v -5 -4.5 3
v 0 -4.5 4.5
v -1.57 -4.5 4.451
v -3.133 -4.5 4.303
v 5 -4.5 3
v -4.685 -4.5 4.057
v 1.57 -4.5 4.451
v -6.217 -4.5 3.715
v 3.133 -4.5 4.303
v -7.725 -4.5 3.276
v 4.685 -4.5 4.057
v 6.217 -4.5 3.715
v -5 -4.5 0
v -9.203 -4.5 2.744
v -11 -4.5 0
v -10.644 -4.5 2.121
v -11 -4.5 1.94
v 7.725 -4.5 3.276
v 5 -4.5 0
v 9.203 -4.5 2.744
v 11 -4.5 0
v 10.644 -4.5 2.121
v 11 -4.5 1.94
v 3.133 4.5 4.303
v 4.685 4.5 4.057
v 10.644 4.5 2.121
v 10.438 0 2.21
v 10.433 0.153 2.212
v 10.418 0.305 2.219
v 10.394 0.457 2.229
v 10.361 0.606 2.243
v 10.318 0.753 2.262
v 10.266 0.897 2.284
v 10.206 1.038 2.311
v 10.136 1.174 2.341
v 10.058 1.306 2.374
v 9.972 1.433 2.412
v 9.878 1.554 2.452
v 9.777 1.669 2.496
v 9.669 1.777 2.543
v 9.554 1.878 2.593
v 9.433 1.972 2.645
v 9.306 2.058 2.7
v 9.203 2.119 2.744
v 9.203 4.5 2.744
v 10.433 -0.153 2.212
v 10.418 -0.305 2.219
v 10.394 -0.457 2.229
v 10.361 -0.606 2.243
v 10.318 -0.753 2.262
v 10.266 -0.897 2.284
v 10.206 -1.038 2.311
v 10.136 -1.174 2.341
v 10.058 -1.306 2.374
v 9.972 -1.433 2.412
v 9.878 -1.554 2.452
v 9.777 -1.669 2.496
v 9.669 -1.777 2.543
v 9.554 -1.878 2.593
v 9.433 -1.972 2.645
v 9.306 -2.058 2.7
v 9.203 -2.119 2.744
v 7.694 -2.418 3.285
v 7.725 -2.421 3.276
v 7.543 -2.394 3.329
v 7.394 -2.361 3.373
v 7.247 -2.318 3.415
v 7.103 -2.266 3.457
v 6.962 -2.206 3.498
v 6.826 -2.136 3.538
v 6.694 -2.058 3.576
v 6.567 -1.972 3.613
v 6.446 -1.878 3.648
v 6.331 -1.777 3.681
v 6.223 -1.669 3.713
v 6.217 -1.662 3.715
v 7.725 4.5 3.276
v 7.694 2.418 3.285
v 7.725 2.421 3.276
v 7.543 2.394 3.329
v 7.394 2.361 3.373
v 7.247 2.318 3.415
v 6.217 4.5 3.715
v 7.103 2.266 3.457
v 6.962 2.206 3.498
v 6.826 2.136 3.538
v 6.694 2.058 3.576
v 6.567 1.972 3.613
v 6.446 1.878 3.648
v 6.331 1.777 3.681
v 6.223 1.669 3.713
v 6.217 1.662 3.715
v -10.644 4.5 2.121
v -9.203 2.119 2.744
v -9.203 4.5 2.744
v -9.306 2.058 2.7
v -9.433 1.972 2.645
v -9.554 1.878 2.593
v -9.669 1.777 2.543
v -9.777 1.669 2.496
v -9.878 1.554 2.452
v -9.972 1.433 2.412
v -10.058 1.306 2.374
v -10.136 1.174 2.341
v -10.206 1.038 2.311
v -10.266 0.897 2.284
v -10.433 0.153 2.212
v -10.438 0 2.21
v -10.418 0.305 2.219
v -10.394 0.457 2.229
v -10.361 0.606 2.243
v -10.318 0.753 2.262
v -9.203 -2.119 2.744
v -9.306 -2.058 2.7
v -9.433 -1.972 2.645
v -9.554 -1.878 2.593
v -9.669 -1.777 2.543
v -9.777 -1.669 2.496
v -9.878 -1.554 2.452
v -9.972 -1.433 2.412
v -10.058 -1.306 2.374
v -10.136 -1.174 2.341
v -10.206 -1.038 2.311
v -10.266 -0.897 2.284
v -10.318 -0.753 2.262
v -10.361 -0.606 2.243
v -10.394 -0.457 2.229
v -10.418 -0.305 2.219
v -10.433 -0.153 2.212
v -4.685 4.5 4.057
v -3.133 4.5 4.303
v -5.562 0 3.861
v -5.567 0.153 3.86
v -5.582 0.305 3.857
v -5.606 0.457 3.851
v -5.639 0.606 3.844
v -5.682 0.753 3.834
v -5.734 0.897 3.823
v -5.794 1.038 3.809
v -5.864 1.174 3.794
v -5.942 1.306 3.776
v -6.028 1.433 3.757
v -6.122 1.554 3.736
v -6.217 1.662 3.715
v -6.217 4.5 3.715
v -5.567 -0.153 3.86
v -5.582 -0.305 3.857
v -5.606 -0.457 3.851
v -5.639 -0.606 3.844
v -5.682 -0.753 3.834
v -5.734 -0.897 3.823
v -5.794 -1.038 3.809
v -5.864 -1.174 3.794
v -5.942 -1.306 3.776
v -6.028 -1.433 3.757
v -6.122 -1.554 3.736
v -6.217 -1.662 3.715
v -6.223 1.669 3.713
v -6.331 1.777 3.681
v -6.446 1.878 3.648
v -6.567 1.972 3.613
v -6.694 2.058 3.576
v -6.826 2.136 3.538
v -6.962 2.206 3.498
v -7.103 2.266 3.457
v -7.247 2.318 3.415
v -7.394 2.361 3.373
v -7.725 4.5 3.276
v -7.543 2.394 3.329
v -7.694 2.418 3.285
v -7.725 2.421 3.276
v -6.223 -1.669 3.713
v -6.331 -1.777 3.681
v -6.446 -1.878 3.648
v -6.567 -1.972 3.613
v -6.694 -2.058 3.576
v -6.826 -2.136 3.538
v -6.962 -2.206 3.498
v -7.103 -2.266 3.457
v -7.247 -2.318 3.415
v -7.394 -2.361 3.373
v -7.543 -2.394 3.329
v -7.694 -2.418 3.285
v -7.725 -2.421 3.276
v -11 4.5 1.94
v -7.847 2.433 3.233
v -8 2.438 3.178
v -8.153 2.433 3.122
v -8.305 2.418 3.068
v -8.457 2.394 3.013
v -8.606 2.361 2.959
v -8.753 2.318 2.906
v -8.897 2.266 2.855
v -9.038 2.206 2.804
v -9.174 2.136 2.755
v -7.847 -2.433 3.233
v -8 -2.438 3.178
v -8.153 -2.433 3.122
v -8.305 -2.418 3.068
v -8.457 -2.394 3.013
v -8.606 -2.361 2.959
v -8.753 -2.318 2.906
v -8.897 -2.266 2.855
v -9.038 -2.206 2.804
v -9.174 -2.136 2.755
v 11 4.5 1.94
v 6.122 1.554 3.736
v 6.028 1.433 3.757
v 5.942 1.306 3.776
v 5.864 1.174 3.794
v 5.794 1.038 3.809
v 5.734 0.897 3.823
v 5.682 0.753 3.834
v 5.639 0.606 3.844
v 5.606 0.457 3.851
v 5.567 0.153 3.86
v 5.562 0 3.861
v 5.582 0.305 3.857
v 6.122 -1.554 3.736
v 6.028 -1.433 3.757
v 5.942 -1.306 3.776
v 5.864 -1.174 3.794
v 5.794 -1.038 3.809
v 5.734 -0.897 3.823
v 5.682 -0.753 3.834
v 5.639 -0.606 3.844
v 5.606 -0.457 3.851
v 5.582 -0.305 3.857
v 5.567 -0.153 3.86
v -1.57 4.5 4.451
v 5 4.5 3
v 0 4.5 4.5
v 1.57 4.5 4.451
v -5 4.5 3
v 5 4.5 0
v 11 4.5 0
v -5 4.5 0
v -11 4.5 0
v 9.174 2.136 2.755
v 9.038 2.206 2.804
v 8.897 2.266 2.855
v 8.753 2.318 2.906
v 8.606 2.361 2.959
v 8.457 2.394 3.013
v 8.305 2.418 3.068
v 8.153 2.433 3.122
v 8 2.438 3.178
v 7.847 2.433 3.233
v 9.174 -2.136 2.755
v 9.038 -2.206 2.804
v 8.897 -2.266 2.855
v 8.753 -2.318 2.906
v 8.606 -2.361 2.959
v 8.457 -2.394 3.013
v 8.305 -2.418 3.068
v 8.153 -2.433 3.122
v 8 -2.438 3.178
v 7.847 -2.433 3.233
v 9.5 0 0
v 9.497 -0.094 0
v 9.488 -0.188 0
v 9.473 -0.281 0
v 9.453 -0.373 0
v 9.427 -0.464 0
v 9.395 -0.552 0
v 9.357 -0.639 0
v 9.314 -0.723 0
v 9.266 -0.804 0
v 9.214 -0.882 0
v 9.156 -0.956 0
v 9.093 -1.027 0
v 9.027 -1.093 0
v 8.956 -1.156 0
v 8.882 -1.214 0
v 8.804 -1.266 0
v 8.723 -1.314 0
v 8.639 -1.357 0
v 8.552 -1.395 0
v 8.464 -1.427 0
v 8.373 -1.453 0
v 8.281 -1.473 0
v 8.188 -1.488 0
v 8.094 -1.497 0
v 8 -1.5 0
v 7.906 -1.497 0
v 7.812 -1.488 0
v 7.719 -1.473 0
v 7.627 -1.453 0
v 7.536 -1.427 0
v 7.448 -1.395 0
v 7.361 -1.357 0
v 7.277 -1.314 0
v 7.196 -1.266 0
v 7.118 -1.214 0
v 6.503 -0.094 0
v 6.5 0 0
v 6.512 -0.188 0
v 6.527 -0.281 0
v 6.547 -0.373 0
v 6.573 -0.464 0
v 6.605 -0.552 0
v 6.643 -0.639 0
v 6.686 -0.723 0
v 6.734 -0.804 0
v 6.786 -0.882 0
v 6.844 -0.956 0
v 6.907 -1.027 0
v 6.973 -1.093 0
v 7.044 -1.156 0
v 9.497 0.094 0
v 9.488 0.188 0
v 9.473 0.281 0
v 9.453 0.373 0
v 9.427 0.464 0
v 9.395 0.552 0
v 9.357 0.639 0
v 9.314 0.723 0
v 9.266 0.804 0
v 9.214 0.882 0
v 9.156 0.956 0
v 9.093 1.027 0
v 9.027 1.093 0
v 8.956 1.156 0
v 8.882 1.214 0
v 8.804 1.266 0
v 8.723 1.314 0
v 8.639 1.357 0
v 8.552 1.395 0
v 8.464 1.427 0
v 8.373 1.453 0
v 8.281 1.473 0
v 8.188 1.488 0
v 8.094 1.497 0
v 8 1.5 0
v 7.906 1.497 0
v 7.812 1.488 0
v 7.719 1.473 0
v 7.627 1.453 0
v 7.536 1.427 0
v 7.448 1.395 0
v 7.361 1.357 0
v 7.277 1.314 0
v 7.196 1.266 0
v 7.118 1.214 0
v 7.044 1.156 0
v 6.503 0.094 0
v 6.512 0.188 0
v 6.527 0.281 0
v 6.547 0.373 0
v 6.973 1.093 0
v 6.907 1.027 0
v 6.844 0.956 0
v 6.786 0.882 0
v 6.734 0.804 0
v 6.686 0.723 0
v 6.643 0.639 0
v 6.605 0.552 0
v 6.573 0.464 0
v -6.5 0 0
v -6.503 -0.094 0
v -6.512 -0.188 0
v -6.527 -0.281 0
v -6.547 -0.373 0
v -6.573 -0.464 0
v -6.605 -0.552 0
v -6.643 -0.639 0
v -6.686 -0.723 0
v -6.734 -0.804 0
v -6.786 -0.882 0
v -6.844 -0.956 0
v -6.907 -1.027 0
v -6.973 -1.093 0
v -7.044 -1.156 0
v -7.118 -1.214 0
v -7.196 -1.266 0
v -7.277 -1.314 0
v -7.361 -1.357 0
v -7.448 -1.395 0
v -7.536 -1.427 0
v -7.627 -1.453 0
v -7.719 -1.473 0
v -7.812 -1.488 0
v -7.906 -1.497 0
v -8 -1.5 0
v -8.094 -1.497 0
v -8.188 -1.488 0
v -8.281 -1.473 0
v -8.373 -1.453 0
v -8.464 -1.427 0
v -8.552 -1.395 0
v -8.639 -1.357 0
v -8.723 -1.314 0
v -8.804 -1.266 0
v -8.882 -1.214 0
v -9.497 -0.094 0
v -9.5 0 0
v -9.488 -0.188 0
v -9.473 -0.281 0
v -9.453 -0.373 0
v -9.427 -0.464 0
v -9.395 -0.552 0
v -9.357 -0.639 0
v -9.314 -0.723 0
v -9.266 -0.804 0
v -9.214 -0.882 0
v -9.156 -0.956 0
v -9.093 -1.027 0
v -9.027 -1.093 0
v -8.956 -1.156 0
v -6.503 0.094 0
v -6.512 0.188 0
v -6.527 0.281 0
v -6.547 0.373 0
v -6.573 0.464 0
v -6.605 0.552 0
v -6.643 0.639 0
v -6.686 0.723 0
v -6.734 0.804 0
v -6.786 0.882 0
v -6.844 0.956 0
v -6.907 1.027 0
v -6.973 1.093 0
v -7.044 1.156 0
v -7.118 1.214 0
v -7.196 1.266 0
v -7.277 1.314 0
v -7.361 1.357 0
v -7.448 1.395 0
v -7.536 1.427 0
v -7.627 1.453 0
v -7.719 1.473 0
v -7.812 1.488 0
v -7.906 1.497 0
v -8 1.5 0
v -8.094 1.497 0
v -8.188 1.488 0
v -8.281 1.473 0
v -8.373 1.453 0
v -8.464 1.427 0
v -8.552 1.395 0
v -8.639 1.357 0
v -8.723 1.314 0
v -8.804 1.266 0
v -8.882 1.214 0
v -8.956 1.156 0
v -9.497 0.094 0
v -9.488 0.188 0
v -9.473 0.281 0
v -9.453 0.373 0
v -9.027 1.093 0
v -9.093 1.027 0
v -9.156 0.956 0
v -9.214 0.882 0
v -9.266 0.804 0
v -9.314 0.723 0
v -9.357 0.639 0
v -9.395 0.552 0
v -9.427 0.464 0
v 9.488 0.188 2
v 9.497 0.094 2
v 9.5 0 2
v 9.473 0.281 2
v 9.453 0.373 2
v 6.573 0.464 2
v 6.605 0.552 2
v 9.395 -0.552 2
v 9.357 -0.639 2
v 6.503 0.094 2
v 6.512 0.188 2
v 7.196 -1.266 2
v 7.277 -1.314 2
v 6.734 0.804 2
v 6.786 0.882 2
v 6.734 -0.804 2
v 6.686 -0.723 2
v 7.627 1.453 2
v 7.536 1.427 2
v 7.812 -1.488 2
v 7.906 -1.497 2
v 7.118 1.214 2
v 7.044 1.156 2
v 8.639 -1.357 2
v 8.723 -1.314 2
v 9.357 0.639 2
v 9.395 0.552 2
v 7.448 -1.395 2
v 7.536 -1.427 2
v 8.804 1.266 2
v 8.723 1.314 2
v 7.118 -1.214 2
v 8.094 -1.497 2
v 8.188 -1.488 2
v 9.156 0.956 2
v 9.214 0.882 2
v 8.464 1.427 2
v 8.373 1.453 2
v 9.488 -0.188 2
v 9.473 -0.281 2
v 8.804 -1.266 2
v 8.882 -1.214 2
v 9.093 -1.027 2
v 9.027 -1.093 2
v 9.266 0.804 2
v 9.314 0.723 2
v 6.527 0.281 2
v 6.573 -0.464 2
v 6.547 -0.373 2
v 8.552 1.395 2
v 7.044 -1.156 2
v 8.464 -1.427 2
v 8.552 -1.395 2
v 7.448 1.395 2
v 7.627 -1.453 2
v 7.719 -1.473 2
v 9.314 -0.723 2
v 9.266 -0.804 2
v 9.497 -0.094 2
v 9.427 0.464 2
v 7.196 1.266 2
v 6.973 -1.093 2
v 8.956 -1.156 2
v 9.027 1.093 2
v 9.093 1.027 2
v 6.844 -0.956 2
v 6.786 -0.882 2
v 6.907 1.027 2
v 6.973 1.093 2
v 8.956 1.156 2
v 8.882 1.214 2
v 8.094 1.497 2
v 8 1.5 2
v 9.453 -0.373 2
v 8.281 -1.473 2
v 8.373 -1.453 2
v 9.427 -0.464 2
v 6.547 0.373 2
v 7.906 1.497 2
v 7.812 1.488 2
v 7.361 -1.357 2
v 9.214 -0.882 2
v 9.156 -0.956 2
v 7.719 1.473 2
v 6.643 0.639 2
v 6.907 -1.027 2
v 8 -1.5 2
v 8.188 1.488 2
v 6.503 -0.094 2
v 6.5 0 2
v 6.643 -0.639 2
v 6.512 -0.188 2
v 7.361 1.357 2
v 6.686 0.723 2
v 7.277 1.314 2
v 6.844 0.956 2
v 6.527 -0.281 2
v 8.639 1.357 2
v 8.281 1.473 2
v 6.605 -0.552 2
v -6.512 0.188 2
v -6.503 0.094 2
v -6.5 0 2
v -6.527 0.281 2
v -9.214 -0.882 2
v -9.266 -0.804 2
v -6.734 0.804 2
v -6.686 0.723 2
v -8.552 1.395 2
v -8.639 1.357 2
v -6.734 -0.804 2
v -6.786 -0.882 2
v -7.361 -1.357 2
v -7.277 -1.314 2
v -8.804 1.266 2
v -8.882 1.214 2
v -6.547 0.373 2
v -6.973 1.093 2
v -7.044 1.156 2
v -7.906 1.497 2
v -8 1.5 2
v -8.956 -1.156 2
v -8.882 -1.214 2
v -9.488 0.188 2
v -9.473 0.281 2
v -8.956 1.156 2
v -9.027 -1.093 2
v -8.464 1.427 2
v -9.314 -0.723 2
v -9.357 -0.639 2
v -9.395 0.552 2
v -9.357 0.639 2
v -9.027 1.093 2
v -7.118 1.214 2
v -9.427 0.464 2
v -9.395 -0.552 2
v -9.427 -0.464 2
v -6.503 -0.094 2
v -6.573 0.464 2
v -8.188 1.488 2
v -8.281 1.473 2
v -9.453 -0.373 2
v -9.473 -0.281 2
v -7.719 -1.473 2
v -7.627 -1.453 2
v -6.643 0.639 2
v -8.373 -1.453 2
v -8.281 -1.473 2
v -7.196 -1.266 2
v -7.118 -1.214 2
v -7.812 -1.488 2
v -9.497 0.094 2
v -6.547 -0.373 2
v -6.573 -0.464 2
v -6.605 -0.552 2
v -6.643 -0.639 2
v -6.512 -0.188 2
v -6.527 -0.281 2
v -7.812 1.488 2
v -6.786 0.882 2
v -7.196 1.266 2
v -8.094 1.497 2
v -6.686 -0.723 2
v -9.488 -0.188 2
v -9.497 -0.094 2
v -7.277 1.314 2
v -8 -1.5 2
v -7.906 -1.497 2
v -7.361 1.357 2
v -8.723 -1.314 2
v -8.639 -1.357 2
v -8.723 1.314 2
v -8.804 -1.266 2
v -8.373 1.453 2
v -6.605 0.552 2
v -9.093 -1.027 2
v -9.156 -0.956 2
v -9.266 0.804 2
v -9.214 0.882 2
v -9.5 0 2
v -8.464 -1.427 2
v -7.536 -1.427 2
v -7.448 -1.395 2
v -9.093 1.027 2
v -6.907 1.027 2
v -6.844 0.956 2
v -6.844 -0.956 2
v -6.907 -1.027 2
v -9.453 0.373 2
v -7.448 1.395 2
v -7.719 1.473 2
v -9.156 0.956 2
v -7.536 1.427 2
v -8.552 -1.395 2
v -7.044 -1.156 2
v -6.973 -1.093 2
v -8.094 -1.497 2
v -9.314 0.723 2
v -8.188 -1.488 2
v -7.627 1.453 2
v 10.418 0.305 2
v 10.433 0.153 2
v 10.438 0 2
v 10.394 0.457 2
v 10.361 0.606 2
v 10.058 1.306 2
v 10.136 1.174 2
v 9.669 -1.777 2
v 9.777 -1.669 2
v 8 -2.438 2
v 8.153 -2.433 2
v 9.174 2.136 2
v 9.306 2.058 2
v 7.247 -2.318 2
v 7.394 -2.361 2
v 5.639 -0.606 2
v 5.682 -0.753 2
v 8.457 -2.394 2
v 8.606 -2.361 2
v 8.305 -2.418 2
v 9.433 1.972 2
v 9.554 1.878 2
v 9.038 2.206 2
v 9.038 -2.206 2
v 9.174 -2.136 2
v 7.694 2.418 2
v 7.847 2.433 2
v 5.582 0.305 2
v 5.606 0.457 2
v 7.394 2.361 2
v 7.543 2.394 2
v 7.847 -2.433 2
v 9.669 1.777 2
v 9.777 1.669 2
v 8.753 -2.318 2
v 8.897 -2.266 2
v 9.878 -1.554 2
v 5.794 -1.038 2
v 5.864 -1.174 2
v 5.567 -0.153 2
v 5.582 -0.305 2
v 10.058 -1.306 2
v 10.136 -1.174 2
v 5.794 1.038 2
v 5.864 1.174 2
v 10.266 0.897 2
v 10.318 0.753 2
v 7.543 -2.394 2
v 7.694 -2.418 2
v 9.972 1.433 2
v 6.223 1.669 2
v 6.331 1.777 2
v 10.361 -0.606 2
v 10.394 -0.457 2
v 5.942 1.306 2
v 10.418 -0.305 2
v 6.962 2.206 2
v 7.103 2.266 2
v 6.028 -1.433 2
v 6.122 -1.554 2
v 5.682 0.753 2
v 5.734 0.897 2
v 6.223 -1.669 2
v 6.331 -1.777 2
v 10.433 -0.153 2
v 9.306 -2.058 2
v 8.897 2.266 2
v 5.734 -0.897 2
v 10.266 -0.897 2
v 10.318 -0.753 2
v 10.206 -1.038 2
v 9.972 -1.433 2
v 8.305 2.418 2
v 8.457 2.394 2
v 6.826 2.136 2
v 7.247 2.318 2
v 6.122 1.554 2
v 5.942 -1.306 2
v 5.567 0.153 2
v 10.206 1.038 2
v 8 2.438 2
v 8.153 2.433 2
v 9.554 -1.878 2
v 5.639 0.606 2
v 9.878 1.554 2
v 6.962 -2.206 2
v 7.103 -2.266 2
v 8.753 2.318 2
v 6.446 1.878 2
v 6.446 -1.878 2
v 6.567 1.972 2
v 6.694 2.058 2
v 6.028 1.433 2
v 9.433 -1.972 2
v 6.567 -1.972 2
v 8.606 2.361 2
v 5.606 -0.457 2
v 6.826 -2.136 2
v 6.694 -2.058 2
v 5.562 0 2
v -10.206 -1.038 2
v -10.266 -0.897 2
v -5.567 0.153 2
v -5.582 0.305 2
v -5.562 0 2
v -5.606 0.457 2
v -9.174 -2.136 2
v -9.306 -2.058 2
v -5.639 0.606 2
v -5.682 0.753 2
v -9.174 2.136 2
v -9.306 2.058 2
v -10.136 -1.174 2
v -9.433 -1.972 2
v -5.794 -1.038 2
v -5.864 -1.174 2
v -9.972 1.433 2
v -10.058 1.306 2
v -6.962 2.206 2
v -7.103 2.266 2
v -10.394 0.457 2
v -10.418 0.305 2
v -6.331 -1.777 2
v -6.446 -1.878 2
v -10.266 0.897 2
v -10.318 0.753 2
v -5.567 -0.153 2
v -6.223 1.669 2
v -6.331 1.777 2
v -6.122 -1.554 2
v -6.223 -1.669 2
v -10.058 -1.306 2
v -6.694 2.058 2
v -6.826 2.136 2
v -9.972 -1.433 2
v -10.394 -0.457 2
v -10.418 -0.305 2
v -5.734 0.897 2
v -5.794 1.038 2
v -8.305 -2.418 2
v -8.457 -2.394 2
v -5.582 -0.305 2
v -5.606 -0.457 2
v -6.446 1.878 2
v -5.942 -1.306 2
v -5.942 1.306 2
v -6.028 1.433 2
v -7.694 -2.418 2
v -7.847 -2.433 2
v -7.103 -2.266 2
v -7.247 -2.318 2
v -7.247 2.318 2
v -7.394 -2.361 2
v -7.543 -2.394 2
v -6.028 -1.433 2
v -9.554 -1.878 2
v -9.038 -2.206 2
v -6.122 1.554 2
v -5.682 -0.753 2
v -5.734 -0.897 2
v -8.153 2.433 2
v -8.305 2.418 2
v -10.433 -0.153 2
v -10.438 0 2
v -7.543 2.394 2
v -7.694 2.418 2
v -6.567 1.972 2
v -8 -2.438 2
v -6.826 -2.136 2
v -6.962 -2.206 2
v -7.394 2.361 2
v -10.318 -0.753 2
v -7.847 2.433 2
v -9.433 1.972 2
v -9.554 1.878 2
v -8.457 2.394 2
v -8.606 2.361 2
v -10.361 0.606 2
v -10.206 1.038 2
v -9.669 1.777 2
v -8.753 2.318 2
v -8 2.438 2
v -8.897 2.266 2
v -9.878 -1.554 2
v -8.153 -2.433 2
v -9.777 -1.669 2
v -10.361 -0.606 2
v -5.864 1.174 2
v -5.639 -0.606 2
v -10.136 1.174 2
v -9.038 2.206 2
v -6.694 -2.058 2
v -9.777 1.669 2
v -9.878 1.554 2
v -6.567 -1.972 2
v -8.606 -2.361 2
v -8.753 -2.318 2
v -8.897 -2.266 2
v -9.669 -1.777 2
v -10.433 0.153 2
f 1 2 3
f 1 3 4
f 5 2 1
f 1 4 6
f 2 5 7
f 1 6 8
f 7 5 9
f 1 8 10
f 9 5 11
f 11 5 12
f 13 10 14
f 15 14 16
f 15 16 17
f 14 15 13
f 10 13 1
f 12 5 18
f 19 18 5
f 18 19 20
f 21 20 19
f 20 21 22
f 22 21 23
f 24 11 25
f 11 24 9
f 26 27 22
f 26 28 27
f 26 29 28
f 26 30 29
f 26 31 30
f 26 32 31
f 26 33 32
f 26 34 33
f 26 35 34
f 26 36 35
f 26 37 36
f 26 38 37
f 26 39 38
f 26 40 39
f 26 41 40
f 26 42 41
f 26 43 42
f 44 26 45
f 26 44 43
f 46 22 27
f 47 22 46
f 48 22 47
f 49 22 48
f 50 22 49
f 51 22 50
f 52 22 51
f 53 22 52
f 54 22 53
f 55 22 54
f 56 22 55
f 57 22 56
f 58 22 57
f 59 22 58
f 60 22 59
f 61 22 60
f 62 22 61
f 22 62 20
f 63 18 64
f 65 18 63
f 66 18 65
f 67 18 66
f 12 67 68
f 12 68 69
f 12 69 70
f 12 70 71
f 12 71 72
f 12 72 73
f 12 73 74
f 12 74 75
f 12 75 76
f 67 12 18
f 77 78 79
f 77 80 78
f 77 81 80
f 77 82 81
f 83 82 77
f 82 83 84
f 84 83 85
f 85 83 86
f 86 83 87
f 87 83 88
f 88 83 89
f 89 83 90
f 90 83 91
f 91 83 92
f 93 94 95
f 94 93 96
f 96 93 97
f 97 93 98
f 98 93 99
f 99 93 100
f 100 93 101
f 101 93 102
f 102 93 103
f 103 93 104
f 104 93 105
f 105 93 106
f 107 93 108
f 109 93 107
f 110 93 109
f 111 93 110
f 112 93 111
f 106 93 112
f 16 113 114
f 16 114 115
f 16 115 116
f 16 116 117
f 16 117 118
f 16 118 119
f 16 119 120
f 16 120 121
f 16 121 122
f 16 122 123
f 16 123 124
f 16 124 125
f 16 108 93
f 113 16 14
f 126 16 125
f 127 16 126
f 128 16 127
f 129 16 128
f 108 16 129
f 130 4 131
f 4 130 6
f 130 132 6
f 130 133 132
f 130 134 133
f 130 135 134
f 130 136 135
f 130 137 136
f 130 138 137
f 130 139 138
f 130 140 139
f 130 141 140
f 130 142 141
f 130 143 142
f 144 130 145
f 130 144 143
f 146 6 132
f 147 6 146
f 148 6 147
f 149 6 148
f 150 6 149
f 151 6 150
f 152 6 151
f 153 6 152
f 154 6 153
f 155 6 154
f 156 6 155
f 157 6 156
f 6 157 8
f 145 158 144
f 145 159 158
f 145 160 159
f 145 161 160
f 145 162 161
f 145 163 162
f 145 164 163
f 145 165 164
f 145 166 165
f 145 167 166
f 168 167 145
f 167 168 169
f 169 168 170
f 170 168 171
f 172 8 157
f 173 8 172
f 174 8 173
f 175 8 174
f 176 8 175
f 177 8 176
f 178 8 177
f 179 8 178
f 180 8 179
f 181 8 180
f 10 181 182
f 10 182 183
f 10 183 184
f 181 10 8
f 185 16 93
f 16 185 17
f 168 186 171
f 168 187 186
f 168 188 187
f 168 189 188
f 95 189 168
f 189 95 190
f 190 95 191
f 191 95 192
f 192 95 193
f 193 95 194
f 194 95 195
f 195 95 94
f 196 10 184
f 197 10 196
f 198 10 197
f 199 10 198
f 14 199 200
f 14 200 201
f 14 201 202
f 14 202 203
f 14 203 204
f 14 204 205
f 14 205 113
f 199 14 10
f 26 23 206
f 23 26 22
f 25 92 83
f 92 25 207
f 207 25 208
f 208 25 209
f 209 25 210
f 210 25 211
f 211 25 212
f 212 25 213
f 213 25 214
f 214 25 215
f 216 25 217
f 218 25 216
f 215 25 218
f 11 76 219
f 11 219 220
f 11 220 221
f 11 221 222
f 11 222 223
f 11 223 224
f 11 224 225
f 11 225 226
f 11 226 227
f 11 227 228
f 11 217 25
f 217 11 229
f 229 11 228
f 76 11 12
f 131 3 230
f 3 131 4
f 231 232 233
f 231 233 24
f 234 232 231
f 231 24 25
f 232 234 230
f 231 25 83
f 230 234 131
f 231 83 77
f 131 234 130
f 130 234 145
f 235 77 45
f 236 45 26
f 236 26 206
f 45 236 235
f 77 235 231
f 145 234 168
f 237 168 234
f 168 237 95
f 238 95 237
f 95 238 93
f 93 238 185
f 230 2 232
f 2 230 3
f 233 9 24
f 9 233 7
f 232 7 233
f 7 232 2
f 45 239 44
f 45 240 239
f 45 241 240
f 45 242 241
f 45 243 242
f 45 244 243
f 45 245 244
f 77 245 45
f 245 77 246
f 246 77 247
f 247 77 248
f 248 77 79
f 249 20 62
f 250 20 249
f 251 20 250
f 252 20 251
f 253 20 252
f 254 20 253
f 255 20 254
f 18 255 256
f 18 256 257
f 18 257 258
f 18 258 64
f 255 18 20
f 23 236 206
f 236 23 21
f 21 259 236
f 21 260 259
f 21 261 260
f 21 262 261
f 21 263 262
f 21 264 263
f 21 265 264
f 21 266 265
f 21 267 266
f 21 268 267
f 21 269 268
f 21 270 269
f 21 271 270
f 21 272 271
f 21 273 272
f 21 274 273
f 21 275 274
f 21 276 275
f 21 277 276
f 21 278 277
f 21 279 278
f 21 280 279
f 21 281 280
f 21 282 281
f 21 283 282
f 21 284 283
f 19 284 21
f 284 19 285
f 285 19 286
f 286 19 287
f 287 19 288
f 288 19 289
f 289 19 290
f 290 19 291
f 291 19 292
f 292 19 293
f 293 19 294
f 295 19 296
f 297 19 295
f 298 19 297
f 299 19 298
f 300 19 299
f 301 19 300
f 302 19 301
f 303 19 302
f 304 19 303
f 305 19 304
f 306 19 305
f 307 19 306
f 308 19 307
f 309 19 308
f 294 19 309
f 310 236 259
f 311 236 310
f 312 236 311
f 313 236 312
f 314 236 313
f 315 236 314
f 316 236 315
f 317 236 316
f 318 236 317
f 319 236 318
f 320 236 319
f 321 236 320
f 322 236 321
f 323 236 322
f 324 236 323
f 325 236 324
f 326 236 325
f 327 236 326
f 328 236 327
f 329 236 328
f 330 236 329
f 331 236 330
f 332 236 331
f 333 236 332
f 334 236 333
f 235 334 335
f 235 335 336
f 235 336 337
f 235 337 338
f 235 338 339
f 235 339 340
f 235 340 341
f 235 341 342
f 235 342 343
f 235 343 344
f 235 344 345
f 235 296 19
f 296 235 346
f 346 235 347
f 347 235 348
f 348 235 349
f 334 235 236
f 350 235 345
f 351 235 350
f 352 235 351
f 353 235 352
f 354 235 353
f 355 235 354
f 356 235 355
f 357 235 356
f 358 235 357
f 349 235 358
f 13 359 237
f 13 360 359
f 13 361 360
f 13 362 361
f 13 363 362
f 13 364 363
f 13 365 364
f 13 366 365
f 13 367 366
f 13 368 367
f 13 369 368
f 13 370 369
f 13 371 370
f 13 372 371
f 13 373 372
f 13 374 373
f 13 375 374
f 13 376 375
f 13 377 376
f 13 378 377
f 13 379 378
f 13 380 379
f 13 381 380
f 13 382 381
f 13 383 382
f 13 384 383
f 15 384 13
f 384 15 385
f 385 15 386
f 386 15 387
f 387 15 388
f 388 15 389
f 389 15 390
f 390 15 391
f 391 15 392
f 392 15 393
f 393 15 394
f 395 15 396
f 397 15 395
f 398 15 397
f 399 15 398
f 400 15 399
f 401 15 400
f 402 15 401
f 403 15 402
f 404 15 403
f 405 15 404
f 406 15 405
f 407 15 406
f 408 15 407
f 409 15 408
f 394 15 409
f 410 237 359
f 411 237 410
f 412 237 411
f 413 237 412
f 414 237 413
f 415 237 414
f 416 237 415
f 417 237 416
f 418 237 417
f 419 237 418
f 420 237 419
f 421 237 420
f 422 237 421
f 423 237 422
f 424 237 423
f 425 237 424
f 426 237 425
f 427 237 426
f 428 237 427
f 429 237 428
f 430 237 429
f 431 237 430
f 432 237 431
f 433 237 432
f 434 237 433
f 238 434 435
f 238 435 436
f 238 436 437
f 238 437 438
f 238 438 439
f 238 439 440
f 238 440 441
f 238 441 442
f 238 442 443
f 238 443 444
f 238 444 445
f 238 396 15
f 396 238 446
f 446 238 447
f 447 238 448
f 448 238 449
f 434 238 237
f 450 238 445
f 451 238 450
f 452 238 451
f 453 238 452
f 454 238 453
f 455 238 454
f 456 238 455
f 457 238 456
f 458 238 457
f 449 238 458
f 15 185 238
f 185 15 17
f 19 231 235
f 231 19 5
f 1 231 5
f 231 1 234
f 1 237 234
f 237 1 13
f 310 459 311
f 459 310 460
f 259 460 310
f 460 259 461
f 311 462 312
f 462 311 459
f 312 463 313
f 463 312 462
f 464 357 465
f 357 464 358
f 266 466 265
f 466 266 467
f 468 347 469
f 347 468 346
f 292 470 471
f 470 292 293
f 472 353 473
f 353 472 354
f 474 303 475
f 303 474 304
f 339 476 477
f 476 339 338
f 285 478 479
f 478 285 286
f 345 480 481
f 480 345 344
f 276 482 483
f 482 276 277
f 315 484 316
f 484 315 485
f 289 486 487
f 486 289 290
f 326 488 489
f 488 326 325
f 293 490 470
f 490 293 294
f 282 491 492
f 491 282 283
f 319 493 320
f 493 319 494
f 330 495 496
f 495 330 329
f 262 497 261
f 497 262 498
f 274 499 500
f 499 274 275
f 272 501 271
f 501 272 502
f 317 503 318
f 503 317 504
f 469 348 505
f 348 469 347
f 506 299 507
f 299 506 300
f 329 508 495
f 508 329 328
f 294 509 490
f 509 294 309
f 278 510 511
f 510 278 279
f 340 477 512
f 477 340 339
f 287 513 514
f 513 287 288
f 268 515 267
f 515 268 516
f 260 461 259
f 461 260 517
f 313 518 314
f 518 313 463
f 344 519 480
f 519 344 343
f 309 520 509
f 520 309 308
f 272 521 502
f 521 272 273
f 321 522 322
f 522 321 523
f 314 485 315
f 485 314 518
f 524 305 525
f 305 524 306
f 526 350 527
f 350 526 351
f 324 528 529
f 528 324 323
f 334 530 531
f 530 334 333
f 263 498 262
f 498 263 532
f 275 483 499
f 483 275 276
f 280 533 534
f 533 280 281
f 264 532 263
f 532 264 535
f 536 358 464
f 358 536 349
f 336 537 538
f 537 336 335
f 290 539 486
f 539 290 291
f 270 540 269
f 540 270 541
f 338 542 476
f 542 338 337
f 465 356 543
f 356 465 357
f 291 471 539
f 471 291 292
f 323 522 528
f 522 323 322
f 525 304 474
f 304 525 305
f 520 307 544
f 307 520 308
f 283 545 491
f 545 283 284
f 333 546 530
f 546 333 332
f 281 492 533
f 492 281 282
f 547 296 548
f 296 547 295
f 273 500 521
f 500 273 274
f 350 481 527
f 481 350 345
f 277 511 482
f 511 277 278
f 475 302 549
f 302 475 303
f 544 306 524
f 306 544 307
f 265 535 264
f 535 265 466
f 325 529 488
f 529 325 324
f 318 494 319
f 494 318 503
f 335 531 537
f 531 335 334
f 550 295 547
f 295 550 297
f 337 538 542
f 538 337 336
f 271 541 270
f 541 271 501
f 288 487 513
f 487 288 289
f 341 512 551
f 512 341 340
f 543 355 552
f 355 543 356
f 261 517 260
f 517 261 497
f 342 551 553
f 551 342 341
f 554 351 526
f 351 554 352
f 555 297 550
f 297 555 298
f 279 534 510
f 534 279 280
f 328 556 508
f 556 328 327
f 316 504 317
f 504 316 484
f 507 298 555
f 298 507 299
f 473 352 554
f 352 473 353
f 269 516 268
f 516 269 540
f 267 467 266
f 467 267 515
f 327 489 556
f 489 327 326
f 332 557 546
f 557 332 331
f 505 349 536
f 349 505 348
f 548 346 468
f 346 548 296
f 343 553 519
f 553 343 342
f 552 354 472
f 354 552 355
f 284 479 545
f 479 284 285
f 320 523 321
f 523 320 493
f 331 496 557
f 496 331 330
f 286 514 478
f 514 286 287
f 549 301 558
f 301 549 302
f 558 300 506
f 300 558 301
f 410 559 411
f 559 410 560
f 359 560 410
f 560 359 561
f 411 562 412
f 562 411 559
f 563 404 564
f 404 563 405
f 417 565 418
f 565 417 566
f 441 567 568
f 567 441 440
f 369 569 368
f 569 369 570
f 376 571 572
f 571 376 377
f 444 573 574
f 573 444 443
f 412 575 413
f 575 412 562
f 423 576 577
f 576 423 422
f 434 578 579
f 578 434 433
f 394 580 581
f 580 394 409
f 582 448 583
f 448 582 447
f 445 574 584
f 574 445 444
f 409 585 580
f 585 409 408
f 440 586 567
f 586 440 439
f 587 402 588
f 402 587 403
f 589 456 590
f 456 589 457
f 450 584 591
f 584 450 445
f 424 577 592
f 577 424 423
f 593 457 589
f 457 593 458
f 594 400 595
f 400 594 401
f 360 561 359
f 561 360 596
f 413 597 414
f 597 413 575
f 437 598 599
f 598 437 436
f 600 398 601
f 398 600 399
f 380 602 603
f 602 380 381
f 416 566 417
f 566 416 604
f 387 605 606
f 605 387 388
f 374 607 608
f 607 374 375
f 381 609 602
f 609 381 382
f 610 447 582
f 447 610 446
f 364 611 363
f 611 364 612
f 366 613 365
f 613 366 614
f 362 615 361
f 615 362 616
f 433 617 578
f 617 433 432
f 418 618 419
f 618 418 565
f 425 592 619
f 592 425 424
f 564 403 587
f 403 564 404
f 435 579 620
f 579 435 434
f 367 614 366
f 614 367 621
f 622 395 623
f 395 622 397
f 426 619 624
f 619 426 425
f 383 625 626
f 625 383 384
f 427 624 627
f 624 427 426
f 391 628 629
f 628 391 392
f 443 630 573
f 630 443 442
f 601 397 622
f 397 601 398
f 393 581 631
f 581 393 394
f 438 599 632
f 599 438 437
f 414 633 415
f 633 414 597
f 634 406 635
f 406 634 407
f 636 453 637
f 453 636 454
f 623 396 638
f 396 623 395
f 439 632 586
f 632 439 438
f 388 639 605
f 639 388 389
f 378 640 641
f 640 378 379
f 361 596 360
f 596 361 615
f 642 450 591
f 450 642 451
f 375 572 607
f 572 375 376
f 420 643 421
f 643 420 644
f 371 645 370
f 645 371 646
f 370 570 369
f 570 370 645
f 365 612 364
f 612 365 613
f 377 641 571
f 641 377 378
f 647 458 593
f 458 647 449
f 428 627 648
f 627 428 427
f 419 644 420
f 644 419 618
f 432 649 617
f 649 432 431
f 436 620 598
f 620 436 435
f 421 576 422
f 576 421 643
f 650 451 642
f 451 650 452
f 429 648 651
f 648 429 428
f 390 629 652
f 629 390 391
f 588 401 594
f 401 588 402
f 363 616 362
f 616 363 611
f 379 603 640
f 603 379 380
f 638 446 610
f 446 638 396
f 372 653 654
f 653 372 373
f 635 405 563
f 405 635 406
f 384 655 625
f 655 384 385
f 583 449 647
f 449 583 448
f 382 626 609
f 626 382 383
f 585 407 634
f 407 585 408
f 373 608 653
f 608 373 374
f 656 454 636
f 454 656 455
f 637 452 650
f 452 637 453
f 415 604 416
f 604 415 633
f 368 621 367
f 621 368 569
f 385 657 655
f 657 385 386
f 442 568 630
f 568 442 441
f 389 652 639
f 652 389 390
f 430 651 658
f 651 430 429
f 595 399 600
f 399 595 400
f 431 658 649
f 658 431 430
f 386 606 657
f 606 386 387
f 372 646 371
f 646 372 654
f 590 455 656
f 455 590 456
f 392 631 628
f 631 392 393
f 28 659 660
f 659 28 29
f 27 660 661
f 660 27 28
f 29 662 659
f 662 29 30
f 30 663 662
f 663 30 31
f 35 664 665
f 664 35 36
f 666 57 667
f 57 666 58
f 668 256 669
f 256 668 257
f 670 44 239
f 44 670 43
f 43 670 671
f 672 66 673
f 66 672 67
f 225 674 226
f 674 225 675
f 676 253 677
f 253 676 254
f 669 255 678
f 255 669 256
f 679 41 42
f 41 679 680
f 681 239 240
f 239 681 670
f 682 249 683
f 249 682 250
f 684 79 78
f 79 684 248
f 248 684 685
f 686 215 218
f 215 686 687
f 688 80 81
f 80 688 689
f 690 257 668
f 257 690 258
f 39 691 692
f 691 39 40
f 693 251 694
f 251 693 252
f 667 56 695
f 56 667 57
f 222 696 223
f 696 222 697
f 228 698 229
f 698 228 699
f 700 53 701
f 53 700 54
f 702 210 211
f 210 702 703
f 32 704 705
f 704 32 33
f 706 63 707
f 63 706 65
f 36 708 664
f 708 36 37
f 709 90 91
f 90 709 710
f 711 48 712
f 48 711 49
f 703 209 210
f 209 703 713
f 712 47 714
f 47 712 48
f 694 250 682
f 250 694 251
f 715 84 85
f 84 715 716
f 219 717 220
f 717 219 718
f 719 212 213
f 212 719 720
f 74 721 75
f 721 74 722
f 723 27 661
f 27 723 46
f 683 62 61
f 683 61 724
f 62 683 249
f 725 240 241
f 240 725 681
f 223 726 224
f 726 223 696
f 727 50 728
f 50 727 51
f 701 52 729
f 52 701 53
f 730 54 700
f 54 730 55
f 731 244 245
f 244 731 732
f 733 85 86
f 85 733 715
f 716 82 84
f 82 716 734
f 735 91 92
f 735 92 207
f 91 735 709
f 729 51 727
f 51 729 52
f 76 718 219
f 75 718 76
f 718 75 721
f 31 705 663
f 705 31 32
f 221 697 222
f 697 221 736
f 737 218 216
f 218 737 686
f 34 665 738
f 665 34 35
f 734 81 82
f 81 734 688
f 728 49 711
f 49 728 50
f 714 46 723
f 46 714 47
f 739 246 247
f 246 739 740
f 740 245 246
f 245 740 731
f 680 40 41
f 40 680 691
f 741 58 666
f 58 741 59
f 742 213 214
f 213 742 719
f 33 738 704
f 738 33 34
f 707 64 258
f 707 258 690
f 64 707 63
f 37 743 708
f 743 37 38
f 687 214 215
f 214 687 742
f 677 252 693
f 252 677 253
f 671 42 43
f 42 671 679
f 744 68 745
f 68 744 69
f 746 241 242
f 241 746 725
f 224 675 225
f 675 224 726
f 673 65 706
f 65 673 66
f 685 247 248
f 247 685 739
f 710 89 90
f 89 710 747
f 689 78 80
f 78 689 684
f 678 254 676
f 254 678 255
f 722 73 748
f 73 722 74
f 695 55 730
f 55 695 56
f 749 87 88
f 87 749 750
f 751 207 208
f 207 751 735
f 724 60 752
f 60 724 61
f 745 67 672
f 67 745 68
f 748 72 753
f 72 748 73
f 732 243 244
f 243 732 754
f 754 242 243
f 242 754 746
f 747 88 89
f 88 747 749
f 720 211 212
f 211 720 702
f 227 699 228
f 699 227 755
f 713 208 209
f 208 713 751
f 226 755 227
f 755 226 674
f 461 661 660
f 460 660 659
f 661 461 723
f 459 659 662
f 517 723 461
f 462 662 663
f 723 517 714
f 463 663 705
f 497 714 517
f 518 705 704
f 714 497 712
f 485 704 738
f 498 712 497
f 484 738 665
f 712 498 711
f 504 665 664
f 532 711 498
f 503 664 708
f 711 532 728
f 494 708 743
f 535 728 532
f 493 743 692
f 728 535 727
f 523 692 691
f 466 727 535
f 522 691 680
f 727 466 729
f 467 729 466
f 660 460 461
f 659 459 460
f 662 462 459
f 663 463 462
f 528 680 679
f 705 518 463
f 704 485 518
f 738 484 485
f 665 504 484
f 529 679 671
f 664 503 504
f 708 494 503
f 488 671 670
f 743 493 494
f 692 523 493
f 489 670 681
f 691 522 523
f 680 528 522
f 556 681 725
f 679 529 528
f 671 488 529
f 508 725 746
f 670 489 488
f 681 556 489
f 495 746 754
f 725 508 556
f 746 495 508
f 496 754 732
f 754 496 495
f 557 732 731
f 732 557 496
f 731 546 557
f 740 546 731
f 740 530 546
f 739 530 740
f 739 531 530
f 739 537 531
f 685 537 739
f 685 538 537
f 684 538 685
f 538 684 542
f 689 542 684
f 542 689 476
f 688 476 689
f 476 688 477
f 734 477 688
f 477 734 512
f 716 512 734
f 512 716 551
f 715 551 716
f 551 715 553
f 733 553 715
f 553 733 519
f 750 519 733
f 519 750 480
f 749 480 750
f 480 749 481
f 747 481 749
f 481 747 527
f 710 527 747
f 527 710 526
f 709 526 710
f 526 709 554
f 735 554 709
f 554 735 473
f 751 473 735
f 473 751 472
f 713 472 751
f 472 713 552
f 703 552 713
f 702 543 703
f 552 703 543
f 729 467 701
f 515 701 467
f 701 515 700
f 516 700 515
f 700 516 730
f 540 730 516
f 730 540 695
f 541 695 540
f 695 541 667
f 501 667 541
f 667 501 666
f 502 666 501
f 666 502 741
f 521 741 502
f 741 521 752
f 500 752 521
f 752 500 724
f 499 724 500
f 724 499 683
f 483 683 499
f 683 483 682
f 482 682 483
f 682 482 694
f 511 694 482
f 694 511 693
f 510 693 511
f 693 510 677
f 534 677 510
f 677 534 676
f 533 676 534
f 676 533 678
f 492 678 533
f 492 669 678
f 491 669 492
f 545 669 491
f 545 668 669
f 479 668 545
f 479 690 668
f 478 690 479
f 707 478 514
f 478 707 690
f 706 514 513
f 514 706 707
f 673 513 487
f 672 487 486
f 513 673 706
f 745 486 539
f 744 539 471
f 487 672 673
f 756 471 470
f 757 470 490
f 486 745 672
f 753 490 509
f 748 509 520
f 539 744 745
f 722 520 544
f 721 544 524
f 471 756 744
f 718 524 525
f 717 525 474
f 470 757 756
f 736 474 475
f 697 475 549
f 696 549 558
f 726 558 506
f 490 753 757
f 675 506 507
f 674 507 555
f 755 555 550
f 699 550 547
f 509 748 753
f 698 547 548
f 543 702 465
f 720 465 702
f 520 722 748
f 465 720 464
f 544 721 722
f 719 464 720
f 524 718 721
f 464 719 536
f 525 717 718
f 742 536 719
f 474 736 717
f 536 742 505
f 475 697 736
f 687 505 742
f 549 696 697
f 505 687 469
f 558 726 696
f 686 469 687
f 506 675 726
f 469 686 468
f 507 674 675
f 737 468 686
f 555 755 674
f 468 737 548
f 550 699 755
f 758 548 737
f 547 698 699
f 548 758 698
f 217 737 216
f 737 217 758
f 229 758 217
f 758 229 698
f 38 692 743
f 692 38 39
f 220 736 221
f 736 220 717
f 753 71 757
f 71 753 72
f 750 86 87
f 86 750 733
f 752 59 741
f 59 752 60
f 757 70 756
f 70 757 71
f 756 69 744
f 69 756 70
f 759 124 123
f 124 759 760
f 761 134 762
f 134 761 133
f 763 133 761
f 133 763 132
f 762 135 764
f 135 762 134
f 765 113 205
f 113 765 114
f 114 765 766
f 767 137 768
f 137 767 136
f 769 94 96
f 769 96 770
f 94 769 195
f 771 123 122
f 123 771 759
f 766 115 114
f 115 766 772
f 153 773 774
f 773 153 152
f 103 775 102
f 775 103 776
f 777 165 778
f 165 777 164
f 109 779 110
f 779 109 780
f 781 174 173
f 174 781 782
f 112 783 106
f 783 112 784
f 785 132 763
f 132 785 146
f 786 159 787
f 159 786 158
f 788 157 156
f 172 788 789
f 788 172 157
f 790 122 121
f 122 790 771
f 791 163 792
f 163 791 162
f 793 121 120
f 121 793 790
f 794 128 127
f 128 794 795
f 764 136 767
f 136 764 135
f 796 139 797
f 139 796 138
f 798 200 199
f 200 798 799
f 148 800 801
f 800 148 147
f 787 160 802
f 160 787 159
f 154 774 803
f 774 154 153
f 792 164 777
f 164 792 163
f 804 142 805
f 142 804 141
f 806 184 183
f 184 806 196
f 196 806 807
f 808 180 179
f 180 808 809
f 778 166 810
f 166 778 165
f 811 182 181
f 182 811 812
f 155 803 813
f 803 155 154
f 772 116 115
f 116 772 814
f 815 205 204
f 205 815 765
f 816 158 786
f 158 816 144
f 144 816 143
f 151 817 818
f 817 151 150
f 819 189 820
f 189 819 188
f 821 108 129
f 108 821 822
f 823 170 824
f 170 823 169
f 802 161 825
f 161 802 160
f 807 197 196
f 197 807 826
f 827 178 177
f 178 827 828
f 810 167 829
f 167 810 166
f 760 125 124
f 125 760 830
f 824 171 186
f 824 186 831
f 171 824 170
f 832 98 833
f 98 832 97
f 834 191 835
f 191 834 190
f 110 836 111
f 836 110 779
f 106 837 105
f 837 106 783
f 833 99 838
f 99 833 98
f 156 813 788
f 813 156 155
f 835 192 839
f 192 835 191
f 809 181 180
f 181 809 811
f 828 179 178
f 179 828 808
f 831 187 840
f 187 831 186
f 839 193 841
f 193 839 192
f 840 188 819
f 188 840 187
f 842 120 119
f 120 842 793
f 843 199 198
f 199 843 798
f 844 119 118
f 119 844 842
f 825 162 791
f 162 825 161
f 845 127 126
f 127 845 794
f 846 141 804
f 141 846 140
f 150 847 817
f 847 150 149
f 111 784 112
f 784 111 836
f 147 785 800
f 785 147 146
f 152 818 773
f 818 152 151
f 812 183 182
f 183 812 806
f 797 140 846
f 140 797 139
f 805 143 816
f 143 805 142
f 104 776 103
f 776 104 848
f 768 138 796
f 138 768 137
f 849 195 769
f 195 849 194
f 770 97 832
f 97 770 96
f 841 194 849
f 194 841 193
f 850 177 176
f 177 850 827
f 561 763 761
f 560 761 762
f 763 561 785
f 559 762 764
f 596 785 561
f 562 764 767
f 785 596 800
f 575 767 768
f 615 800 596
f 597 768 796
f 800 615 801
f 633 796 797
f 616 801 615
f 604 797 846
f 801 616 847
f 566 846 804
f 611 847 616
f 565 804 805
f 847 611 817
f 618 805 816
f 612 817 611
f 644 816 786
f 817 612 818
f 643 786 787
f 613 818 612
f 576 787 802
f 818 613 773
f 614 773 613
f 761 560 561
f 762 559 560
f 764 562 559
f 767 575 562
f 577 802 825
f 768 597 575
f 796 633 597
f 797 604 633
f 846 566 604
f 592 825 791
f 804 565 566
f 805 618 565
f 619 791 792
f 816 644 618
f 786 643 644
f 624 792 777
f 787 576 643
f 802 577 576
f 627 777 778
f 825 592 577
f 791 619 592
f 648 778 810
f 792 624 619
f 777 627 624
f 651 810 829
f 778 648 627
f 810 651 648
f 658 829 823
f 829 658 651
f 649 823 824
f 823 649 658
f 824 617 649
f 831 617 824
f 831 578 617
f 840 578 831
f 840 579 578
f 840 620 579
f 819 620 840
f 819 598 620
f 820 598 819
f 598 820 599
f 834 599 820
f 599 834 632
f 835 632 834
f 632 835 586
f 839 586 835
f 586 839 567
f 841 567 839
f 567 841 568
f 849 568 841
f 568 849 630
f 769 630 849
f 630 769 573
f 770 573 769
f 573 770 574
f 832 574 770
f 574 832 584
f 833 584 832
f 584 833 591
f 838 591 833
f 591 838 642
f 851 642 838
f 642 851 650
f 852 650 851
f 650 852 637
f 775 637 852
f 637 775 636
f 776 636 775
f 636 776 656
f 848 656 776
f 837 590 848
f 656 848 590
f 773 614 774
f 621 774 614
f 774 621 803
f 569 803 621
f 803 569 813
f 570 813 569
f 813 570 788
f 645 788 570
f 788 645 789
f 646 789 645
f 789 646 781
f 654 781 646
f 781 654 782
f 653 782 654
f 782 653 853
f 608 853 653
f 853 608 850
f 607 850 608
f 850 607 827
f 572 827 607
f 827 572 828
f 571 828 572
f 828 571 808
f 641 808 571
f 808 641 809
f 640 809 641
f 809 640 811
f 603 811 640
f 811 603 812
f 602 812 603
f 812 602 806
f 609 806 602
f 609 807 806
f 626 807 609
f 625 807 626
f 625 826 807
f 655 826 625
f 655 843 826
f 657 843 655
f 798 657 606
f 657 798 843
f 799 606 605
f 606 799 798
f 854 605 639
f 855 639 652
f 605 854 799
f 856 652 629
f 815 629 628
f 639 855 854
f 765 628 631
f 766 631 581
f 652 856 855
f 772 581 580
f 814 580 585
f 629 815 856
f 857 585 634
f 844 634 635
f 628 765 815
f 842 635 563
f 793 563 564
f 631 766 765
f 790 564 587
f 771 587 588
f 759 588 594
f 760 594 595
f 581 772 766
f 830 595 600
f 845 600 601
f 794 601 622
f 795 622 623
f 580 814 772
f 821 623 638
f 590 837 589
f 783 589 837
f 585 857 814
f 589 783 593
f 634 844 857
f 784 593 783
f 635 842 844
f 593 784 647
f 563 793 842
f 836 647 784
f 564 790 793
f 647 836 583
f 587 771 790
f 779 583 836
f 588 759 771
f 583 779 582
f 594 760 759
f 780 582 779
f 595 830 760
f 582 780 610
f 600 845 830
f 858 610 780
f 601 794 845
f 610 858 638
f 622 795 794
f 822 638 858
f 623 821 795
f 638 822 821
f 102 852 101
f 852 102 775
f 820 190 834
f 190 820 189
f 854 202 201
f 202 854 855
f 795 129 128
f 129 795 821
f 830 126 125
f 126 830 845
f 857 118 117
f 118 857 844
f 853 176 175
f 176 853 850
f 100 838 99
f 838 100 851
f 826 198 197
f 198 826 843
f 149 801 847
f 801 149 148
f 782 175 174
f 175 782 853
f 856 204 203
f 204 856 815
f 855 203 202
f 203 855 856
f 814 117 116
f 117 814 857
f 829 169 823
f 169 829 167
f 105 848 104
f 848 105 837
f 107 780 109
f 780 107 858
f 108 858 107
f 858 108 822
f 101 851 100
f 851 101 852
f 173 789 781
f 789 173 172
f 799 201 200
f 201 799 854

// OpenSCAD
//Curve quality
$fn=100;//[10:1:300]
/*[LED ribbon parameters]*/
//LED ribbon width
r_laius=10;//[3:1:15]
//LED ribbon height
r_korgus=3;//[2:1:6]
/* [LED ribbon mounting brace parameters] */
//Mounting brace curvature radius
raadius=25;//[20:1:100]
//Mounting brace with one mounting hole
yksik=0;//[0:No,1:Yes]
/* [Hidden] */
korgus=r_korgus*1.5;
kruvi_d=3;
laius=kruvi_d*3;
pikkus=r_laius+4*kruvi_d;
if (yksik!=0) rotate([-90,0,0]) klamber(); else klamber();
module klamber(){
difference(){
translate([0,0,-raadius+korgus])
intersection(){
rotate([90,0,0]) cylinder(laius,r=raadius,center=true);
translate([0,0,raadius-korgus/2]) cube([pikkus,laius,korgus], center=true);
}
cube([r_laius,laius,r_korgus*2], center=true);
translate([r_laius/2+(pikkus/2-r_laius/2)/2,0,0]) cylinder(laius,d=kruvi_d);
translate([-(r_laius/2+(pikkus/2-r_laius/2)/2),0,0]) cylinder(laius,d=kruvi_d);
translate([r_laius/2+(pikkus/2-r_laius/2)/2,0,r_korgus-1]) cylinder(kruvi_d*2,d=kruvi_d+kruvi_d/1.6);
if (yksik==0)
translate([-(r_laius/2+(pikkus/2-r_laius/2)/2),0,r_korgus-1]) cylinder(kruvi_d*2,d=kruvi_d+kruvi_d/1.6);
else{
translate([-(pikkus/2+r_laius/2+1),0,r_korgus]) cube([pikkus,laius,r_korgus*2], center=true);
translate([-r_laius/2,0,0]) cube([r_korgus,laius,r_korgus], center=true);}
}
}
